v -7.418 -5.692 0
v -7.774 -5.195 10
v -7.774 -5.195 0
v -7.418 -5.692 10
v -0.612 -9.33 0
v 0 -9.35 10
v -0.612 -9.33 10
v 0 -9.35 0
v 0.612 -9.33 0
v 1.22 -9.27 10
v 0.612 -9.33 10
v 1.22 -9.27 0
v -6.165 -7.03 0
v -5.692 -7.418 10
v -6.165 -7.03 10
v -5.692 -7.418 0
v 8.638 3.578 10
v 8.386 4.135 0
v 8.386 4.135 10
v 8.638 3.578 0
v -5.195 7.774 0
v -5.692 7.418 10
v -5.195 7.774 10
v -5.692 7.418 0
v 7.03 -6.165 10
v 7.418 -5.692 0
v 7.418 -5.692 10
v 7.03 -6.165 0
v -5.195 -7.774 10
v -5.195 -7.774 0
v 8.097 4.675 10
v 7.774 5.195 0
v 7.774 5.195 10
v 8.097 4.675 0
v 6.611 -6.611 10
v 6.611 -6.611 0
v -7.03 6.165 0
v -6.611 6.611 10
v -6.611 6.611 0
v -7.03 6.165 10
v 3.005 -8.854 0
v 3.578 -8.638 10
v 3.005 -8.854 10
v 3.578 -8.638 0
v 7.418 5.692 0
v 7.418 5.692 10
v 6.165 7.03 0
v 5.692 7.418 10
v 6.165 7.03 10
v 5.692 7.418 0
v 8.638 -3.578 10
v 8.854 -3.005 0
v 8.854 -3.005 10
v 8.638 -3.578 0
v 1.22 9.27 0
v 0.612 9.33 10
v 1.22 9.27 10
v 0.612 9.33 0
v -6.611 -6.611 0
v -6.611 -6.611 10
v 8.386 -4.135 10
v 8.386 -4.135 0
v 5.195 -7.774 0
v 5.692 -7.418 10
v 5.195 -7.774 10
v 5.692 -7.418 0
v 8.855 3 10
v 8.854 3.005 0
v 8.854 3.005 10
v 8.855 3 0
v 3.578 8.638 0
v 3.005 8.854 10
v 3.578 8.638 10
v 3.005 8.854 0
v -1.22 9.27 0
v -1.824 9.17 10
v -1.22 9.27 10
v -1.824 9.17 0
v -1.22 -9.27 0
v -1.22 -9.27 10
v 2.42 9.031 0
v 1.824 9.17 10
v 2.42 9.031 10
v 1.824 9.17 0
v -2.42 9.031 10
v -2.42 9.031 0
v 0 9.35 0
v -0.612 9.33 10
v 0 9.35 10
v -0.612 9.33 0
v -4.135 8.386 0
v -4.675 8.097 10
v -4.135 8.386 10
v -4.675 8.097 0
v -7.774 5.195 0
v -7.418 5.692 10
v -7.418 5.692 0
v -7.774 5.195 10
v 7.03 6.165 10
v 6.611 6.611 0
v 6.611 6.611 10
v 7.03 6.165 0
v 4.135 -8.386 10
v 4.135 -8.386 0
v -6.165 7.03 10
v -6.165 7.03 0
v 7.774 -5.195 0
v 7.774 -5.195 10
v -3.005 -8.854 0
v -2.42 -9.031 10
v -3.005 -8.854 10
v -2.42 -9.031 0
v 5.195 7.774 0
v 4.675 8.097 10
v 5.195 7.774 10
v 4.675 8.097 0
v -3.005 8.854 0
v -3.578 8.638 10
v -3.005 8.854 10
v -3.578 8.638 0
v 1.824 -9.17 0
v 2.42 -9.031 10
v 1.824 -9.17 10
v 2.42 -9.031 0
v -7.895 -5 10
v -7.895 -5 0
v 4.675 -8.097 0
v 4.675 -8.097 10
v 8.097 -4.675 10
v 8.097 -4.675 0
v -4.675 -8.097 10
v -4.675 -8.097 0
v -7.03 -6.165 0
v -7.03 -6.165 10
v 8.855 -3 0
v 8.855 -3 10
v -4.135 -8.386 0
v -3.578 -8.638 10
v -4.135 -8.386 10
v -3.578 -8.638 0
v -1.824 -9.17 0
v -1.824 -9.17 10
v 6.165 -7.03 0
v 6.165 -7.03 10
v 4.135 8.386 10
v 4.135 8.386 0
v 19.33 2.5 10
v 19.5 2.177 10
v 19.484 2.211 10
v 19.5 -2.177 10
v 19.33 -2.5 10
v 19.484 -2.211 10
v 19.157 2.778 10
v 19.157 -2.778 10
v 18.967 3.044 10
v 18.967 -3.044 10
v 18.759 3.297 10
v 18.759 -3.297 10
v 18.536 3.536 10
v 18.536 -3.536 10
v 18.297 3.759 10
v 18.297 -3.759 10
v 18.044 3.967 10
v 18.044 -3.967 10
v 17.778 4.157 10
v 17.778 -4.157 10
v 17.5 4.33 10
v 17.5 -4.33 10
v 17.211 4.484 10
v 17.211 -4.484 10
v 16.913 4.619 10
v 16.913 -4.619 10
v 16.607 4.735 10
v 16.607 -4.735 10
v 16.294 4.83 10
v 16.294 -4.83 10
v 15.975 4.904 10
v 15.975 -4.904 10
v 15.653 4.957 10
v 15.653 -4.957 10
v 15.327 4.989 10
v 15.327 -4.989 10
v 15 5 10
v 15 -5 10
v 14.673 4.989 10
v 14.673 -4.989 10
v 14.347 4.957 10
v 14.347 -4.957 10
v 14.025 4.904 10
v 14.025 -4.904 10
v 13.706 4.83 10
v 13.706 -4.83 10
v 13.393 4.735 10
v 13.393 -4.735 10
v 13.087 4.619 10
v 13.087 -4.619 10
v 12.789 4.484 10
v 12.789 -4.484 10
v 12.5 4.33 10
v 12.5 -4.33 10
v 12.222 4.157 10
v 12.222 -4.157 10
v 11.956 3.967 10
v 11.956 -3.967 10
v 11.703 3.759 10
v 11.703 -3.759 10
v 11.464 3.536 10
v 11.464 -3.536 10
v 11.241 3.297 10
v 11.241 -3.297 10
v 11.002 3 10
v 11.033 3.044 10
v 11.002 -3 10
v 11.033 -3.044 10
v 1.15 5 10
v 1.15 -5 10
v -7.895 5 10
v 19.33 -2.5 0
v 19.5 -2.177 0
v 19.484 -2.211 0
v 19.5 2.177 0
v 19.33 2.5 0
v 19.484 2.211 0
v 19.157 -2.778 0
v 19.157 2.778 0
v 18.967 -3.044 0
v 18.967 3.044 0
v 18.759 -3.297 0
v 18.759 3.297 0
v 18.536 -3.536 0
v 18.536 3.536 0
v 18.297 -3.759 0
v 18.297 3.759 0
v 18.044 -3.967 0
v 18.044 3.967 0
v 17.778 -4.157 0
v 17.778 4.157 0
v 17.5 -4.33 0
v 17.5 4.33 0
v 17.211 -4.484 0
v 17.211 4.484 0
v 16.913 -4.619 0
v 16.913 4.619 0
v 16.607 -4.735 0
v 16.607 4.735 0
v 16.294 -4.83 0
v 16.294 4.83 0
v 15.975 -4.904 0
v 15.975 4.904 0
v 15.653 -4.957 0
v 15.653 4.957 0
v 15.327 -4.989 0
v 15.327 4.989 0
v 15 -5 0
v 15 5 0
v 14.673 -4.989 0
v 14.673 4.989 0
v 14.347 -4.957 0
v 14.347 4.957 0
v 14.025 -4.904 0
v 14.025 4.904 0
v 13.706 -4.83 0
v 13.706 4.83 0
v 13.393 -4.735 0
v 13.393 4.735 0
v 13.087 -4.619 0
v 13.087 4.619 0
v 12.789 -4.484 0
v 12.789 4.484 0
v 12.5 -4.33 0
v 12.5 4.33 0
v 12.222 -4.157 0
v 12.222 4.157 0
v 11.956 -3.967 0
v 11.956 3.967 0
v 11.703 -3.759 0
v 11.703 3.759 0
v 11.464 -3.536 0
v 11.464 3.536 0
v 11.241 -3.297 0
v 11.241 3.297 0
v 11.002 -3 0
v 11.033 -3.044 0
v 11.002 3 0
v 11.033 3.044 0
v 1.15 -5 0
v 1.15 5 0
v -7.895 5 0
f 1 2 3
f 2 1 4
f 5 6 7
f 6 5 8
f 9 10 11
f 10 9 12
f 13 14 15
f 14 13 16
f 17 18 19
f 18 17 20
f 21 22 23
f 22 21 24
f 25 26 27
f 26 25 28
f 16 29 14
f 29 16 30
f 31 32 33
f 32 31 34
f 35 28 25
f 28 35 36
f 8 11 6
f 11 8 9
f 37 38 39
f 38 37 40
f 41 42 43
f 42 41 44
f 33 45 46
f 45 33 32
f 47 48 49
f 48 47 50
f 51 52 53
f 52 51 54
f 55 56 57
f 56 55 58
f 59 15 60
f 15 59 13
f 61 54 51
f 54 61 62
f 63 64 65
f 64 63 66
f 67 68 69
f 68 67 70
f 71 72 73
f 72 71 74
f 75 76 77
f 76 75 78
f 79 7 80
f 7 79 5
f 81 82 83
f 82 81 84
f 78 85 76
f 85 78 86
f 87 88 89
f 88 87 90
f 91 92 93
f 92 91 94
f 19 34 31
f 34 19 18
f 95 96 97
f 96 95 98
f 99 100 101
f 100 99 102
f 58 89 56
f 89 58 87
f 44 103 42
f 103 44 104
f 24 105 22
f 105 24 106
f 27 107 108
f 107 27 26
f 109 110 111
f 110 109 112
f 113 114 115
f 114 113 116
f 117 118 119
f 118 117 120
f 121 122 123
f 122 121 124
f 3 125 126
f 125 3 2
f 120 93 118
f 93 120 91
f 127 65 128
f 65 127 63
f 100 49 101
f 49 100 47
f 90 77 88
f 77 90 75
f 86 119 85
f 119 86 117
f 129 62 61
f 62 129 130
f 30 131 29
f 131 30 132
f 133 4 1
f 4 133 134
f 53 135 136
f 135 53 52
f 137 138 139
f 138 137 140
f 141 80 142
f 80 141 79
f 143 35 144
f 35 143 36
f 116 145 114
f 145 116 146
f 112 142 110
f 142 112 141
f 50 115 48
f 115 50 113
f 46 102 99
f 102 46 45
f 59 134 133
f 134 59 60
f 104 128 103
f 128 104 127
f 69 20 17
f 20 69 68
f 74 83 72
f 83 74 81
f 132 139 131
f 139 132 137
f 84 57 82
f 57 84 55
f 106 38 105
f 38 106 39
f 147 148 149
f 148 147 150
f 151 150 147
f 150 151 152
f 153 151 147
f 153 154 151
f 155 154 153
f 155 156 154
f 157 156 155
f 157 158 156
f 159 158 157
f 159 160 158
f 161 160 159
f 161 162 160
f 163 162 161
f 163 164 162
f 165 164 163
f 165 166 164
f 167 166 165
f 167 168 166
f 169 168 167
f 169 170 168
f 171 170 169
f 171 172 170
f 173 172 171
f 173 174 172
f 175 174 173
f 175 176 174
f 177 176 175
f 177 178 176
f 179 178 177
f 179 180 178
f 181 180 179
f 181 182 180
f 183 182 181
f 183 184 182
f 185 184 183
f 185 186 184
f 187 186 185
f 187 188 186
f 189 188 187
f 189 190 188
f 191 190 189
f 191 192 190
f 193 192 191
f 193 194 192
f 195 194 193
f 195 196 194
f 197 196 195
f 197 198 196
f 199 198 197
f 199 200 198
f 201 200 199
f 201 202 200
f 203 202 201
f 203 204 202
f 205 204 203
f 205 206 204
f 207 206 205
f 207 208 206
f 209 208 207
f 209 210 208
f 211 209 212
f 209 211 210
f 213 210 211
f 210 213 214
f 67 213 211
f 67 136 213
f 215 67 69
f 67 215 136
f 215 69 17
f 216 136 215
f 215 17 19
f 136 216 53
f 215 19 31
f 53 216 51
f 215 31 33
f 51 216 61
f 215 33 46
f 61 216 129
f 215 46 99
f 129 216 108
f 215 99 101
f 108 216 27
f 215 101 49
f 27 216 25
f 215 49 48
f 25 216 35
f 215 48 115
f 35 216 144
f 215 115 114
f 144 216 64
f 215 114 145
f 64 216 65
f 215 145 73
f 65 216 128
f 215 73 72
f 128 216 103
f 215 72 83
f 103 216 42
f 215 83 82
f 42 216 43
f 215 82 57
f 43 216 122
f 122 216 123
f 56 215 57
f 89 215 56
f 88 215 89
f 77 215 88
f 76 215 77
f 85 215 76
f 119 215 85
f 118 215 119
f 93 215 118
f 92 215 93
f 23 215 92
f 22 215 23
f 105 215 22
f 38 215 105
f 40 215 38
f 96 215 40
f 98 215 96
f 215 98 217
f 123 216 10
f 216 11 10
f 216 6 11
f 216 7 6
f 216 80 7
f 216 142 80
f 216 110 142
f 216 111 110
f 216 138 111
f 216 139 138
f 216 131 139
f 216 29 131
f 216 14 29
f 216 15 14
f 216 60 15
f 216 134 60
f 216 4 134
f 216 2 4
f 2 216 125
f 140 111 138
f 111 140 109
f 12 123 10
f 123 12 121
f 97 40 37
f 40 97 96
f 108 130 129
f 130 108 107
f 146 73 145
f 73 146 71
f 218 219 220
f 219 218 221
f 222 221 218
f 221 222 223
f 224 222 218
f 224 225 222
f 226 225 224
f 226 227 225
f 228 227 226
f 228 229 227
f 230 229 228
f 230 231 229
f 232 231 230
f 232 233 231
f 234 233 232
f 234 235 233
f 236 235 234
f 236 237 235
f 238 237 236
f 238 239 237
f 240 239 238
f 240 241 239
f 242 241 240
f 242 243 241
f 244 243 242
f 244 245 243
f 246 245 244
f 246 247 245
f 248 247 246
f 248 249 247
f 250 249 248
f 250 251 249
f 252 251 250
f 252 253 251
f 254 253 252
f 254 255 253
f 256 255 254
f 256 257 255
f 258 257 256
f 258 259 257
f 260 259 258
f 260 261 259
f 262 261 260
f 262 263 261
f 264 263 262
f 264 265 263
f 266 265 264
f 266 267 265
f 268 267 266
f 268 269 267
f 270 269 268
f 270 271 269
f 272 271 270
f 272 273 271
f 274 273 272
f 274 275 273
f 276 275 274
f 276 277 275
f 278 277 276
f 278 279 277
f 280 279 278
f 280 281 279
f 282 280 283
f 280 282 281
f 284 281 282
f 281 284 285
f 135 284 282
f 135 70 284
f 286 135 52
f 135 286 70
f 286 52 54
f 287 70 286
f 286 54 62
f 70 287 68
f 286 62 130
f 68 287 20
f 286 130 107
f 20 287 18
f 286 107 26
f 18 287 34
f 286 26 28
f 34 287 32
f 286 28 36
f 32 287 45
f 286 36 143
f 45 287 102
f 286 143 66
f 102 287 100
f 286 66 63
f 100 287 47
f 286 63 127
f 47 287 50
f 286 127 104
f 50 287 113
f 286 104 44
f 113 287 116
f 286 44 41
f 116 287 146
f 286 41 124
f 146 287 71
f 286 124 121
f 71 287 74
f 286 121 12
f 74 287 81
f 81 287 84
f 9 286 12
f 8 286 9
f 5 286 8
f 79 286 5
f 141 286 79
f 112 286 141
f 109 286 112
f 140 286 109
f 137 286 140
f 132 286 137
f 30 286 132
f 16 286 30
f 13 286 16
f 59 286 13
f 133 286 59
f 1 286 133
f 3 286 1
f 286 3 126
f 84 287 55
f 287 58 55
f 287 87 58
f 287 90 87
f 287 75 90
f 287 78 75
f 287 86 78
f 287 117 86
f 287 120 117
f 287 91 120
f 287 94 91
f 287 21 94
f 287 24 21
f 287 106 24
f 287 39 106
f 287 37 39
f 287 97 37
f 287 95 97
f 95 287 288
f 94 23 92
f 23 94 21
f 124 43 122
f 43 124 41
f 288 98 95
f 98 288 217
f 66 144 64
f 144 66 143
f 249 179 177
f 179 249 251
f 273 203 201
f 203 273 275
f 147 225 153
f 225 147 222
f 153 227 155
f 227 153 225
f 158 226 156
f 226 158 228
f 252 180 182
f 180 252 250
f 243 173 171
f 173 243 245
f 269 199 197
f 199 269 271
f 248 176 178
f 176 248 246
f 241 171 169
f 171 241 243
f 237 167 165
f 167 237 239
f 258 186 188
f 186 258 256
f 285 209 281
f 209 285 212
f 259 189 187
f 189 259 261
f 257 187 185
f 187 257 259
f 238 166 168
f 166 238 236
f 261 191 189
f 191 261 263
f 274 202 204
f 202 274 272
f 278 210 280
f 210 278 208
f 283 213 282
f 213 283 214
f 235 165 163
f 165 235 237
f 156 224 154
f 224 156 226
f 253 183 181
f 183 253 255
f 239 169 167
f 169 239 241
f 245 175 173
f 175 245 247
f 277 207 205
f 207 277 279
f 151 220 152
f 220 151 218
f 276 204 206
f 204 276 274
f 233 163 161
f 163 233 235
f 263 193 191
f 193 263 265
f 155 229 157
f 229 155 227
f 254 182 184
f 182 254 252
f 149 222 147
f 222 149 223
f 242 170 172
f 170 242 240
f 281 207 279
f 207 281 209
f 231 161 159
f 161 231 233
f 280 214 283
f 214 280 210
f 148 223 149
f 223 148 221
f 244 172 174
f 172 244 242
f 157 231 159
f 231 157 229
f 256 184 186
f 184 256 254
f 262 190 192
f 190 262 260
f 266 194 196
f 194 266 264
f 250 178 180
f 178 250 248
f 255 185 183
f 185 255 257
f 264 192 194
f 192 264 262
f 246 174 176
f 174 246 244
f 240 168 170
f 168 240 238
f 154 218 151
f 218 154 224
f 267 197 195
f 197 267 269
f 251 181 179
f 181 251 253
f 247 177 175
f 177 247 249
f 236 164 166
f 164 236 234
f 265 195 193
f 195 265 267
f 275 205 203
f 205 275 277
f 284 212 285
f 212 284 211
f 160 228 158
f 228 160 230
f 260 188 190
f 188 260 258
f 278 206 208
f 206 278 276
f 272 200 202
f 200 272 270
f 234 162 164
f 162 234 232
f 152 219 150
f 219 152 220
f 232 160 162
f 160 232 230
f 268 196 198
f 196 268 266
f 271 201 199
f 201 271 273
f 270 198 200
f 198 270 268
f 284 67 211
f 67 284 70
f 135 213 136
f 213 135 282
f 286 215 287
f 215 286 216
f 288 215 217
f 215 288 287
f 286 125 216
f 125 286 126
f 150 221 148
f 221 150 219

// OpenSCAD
// Snap-on tubing clip for 12.7 mm stand rod
// Print orientation: flat on bed, extrusion along +Z

$fn = 96;

// ---- Dimensions (mm) ----
stand_id     = 12.7;  // stand rod inner diameter
stand_wall   = 3;     // stand ring wall thickness
stand_od     = stand_id + 2 * stand_wall;  // 18.7 outer diameter
tube_id      = 6;     // tubing inner diameter
tube_wall    = 2;     // tubing wall thickness
tube_od      = tube_id + 2 * tube_wall;    // 10 outer diameter
bridge_w     = 6;     // bridge width (Y)
bridge_x0    = 8;     // bridge start (X)
bridge_x1    = 12;    // bridge end (X)
opening_stand = 10;   // stand ring opening width (-X side)
opening_tube  = 4.5;  // tubing ring opening width (+X side)
eps          = 0.5;   // cutter overshoot past faces
height       = 10;    // extrusion height (Z)

// ---- Model ----
difference() {
    union() {
        // Stand rod ring
        cylinder(d = stand_od, h = height);
        // Tubing ring
        translate([15, 0, 0])
            cylinder(d = tube_od, h = height);
        // Solid bridge
        translate([bridge_x0, -bridge_w / 2, 0])
            cube([bridge_x1 - bridge_x0, bridge_w, height]);
    }
    // Stand ring opening (x < 0, -5 < y < 5)
    translate([-stand_od / 2 - eps, -opening_stand / 2, 0])
        cube([opening_stand + 2 * eps, opening_stand, height]);
    // Tubing ring opening (x > 15, -2.25 < y < 2.25)
    translate([15 + tube_od / 2 - eps, -opening_tube / 2, 0])
        cube([opening_tube + 2 * eps, opening_tube, height]);
}
